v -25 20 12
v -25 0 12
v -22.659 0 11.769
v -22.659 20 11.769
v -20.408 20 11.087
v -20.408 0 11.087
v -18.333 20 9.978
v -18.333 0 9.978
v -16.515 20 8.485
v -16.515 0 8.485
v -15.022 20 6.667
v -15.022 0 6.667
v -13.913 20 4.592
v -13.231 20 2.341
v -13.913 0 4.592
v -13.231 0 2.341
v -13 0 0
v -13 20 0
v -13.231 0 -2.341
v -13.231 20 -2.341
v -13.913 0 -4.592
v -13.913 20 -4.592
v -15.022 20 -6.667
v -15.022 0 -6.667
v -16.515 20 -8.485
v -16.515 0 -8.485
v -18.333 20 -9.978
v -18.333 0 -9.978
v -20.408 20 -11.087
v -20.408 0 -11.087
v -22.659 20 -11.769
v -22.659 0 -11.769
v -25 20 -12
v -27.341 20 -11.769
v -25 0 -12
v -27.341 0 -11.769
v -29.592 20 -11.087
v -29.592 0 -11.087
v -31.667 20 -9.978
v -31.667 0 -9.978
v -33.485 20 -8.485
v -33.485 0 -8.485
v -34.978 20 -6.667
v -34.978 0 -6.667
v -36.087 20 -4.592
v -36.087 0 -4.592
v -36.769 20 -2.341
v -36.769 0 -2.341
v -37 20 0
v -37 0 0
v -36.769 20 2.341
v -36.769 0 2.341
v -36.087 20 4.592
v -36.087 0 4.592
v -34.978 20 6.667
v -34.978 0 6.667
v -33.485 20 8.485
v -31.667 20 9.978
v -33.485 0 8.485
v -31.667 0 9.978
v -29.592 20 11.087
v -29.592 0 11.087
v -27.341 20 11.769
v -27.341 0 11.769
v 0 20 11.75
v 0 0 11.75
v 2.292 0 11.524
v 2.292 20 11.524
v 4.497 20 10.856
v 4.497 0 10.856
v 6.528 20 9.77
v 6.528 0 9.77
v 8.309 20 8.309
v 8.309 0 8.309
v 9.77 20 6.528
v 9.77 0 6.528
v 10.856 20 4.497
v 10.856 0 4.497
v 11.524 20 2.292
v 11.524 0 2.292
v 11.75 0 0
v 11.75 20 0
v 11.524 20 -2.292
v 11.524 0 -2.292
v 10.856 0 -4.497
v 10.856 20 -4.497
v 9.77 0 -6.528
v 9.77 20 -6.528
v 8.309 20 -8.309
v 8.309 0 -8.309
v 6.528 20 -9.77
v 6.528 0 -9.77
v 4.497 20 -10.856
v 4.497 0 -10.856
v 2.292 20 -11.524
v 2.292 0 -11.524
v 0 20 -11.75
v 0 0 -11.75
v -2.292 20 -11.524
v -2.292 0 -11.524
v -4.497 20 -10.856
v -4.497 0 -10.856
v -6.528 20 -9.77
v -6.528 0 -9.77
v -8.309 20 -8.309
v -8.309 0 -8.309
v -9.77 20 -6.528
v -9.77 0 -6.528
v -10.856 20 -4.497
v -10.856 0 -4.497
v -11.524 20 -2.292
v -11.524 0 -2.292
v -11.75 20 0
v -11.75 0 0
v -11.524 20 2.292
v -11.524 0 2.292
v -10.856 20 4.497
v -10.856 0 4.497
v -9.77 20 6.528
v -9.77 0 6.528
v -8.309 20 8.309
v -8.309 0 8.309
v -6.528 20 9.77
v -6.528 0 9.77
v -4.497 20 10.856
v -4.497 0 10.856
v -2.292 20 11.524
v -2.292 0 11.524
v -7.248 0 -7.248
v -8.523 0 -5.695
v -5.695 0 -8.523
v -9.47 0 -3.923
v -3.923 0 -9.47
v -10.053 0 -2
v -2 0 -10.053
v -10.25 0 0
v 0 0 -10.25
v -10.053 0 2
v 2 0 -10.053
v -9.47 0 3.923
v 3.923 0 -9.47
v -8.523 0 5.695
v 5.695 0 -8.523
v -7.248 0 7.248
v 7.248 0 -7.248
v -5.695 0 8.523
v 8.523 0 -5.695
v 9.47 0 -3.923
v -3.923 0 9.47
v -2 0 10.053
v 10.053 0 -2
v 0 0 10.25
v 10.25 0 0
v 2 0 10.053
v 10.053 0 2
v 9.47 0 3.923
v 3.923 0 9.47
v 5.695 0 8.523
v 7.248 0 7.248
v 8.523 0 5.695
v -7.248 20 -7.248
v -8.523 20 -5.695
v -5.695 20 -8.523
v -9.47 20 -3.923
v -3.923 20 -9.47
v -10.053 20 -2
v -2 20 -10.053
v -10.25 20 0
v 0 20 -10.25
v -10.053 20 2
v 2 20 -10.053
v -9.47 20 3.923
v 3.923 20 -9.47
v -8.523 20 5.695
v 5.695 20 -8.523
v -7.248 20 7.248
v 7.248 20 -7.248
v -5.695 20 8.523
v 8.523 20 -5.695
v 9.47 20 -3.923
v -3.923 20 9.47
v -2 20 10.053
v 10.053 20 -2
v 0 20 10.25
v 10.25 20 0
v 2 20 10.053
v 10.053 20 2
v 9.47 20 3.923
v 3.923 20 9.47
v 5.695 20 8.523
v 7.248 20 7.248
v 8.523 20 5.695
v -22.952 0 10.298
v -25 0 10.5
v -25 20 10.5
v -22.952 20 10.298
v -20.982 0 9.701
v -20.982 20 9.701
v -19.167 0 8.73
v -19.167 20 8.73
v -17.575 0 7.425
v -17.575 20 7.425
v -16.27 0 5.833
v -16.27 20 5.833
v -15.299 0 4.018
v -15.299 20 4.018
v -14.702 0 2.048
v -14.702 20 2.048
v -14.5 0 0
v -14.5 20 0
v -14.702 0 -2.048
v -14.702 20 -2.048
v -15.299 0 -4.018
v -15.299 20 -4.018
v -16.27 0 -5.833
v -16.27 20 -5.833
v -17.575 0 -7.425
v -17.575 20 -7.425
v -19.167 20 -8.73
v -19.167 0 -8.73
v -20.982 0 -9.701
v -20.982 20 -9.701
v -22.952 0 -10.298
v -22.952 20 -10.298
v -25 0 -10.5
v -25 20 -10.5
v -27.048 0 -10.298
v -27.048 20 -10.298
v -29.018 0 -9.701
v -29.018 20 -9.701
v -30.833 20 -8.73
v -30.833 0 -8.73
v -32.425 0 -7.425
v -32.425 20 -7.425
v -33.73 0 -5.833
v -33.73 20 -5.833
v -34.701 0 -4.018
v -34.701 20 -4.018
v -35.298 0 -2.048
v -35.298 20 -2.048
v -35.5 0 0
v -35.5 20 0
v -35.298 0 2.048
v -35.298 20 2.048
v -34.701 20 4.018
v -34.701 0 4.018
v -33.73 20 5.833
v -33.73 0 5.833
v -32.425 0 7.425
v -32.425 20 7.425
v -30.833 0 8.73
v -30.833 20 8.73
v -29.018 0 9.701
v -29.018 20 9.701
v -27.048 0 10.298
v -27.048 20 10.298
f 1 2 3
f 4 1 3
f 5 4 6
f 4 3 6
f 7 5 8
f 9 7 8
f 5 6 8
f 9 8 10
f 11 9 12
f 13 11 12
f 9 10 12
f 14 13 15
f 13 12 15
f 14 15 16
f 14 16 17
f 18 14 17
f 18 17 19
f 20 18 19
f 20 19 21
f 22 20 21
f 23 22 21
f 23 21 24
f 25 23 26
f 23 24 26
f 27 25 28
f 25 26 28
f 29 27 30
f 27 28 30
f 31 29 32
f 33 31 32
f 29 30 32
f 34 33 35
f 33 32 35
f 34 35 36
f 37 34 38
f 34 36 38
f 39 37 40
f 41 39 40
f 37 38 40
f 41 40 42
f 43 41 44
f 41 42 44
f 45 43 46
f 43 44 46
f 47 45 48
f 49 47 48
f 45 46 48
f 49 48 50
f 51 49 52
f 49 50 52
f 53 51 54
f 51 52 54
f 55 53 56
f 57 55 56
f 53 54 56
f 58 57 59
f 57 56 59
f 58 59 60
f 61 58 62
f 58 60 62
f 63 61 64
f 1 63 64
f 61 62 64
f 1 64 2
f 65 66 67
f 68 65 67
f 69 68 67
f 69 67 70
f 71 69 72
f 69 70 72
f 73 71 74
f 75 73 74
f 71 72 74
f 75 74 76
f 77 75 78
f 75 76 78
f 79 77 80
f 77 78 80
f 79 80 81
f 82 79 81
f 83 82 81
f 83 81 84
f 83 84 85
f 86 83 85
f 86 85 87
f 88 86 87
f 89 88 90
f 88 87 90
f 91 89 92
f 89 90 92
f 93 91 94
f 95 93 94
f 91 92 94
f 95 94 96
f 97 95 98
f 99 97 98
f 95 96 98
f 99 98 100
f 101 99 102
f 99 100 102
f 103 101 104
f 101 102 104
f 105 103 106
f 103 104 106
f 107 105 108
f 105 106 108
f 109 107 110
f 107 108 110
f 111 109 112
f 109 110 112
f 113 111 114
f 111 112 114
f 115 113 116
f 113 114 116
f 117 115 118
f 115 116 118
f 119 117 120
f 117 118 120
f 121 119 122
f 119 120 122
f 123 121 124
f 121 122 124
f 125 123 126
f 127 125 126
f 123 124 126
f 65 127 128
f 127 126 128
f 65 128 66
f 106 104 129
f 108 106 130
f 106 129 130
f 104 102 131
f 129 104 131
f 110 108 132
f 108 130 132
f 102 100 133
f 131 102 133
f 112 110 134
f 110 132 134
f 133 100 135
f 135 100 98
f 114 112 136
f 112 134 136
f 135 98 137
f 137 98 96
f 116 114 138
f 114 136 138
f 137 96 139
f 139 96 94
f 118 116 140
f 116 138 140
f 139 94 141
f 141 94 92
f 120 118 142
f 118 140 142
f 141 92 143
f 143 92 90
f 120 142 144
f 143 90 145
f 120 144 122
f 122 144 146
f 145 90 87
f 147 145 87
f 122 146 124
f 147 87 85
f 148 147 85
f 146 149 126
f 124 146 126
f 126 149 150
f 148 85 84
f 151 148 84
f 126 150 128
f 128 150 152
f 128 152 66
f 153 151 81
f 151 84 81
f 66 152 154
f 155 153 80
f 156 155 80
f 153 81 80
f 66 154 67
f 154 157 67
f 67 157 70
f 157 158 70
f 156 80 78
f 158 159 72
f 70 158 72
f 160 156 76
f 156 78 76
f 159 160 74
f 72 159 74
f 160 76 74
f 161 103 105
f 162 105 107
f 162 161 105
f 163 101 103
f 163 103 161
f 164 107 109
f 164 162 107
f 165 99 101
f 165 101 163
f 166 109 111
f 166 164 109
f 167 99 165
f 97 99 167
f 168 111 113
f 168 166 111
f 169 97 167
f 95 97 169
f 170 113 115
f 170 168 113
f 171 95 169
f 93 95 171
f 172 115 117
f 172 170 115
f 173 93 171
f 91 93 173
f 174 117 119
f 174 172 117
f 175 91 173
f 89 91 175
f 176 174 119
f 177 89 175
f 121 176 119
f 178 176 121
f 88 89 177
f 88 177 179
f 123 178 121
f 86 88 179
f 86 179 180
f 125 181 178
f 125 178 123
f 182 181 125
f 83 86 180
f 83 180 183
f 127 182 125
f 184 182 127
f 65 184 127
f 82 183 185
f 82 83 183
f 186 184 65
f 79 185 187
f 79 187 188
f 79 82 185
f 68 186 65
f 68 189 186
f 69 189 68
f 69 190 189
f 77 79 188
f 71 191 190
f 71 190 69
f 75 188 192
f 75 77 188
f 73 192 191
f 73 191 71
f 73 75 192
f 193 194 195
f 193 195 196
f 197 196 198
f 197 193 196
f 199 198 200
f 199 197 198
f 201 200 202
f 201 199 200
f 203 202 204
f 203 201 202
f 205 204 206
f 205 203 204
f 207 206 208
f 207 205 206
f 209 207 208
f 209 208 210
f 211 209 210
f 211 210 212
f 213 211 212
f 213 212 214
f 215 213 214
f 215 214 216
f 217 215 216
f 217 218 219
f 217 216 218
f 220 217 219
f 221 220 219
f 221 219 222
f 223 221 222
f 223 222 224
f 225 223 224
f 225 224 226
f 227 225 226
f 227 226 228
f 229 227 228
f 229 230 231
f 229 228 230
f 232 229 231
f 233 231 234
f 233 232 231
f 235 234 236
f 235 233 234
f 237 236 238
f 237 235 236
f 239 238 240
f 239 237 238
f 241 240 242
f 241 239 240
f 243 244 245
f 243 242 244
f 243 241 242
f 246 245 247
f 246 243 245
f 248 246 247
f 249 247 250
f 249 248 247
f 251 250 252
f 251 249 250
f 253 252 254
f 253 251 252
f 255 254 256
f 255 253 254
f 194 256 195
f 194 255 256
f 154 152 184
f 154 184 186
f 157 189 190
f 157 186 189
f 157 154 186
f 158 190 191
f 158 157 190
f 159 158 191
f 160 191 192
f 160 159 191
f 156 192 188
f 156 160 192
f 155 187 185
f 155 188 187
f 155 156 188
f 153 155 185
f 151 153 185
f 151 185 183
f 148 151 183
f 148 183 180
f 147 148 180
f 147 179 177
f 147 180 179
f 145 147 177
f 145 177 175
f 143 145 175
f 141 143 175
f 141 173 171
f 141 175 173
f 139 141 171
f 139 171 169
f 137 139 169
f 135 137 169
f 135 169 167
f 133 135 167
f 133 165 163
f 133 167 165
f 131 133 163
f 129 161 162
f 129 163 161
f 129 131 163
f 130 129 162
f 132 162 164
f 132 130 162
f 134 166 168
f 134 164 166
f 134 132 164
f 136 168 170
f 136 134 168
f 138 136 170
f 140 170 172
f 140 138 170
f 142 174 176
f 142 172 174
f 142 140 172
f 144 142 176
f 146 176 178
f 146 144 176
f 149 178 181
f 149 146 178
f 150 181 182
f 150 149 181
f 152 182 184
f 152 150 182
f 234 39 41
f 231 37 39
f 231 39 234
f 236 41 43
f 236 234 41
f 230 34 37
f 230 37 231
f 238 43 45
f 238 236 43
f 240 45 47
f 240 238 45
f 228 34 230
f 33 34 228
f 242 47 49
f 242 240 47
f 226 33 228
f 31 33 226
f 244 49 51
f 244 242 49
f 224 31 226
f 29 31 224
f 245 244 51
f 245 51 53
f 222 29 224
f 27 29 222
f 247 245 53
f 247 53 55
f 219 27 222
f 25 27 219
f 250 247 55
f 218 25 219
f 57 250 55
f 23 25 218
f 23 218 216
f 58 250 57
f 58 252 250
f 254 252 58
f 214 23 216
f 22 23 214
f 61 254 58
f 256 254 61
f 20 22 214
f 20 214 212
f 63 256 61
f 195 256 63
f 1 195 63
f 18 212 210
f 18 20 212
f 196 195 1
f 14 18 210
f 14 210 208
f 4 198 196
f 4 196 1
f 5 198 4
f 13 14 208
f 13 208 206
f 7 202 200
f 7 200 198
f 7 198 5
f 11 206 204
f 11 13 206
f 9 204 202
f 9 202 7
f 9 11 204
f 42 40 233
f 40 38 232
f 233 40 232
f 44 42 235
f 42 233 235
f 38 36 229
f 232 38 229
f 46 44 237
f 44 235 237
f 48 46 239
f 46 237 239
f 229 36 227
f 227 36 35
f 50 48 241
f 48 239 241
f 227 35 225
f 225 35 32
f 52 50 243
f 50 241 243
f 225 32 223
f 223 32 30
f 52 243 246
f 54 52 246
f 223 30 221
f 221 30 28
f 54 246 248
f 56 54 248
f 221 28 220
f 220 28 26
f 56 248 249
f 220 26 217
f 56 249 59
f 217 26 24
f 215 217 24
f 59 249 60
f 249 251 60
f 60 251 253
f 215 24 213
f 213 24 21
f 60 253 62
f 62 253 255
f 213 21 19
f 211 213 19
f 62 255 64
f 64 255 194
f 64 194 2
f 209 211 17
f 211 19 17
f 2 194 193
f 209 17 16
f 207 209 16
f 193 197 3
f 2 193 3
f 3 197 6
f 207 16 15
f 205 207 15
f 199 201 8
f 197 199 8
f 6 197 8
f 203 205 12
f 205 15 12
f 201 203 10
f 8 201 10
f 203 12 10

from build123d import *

# Parameters (mm, degrees)
SKETCH2_R               = 11.75
BOSS_EXTRUDE1_DEPTH     = 20
CUT_EXTRUDE1_DEPTH      = 27.002403735
CUT_EXTRUDE1_DEPTH_BACK = 27.002403735
SKETCH3_R               = 10.25
SKETCH4_R               = 12
BOSS_EXTRUDE2_DEPTH     = 20
CUT_EXTRUDE2_DEPTH      = 44.737855457
CUT_EXTRUDE2_DEPTH_BACK = 44.737855457
SKETCH5_R               = 10.5


with BuildPart() as part:
    # Sketch2 → Boss-Extrude1 (new body)
    with BuildSketch(Plane(origin=(0, 0, 0), x_dir=(1, 0, 0), z_dir=(0, 1, 0))):
        with Locations(Location((0, 0, 0), (0, 0, 270))):
            Circle(SKETCH2_R)
    extrude(amount=BOSS_EXTRUDE1_DEPTH)

    # Sketch3 → Cut-Extrude1 (cut, two sides: drawn at the far end of the back side and taken through both)
    with BuildSketch(Plane(origin=(0, 20, 0), x_dir=(1, 0, 0), z_dir=(0, 1, 0)).offset(-CUT_EXTRUDE1_DEPTH_BACK)):
        with Locations(Location((0, 0, 0), (0, 0, 270))):
            Circle(SKETCH3_R)
    extrude(amount=CUT_EXTRUDE1_DEPTH + CUT_EXTRUDE1_DEPTH_BACK, mode=Mode.SUBTRACT)


with BuildPart() as body_2:
    # Sketch4 → Boss-Extrude2 (new body)
    with BuildSketch(Plane(origin=(0, 0, 0), x_dir=(1, 0, 0), z_dir=(0, 1, 0))):
        with Locations(Location((-25, 0, 0), (0, 0, 270))):
            Circle(SKETCH4_R)
    extrude(amount=BOSS_EXTRUDE2_DEPTH)

    # Sketch5 → Cut-Extrude2 (cut, two sides: drawn at the far end of the back side and taken through both)
    with BuildSketch(Plane(origin=(0, 20, 0), x_dir=(1, 0, 0), z_dir=(0, 1, 0)).offset(-CUT_EXTRUDE2_DEPTH_BACK)):
        with Locations(Location((-25, 0, 0), (0, 0, 270))):
            Circle(SKETCH5_R)
    extrude(amount=CUT_EXTRUDE2_DEPTH + CUT_EXTRUDE2_DEPTH_BACK, mode=Mode.SUBTRACT)


solid = Compound([part.part, body_2.part])
